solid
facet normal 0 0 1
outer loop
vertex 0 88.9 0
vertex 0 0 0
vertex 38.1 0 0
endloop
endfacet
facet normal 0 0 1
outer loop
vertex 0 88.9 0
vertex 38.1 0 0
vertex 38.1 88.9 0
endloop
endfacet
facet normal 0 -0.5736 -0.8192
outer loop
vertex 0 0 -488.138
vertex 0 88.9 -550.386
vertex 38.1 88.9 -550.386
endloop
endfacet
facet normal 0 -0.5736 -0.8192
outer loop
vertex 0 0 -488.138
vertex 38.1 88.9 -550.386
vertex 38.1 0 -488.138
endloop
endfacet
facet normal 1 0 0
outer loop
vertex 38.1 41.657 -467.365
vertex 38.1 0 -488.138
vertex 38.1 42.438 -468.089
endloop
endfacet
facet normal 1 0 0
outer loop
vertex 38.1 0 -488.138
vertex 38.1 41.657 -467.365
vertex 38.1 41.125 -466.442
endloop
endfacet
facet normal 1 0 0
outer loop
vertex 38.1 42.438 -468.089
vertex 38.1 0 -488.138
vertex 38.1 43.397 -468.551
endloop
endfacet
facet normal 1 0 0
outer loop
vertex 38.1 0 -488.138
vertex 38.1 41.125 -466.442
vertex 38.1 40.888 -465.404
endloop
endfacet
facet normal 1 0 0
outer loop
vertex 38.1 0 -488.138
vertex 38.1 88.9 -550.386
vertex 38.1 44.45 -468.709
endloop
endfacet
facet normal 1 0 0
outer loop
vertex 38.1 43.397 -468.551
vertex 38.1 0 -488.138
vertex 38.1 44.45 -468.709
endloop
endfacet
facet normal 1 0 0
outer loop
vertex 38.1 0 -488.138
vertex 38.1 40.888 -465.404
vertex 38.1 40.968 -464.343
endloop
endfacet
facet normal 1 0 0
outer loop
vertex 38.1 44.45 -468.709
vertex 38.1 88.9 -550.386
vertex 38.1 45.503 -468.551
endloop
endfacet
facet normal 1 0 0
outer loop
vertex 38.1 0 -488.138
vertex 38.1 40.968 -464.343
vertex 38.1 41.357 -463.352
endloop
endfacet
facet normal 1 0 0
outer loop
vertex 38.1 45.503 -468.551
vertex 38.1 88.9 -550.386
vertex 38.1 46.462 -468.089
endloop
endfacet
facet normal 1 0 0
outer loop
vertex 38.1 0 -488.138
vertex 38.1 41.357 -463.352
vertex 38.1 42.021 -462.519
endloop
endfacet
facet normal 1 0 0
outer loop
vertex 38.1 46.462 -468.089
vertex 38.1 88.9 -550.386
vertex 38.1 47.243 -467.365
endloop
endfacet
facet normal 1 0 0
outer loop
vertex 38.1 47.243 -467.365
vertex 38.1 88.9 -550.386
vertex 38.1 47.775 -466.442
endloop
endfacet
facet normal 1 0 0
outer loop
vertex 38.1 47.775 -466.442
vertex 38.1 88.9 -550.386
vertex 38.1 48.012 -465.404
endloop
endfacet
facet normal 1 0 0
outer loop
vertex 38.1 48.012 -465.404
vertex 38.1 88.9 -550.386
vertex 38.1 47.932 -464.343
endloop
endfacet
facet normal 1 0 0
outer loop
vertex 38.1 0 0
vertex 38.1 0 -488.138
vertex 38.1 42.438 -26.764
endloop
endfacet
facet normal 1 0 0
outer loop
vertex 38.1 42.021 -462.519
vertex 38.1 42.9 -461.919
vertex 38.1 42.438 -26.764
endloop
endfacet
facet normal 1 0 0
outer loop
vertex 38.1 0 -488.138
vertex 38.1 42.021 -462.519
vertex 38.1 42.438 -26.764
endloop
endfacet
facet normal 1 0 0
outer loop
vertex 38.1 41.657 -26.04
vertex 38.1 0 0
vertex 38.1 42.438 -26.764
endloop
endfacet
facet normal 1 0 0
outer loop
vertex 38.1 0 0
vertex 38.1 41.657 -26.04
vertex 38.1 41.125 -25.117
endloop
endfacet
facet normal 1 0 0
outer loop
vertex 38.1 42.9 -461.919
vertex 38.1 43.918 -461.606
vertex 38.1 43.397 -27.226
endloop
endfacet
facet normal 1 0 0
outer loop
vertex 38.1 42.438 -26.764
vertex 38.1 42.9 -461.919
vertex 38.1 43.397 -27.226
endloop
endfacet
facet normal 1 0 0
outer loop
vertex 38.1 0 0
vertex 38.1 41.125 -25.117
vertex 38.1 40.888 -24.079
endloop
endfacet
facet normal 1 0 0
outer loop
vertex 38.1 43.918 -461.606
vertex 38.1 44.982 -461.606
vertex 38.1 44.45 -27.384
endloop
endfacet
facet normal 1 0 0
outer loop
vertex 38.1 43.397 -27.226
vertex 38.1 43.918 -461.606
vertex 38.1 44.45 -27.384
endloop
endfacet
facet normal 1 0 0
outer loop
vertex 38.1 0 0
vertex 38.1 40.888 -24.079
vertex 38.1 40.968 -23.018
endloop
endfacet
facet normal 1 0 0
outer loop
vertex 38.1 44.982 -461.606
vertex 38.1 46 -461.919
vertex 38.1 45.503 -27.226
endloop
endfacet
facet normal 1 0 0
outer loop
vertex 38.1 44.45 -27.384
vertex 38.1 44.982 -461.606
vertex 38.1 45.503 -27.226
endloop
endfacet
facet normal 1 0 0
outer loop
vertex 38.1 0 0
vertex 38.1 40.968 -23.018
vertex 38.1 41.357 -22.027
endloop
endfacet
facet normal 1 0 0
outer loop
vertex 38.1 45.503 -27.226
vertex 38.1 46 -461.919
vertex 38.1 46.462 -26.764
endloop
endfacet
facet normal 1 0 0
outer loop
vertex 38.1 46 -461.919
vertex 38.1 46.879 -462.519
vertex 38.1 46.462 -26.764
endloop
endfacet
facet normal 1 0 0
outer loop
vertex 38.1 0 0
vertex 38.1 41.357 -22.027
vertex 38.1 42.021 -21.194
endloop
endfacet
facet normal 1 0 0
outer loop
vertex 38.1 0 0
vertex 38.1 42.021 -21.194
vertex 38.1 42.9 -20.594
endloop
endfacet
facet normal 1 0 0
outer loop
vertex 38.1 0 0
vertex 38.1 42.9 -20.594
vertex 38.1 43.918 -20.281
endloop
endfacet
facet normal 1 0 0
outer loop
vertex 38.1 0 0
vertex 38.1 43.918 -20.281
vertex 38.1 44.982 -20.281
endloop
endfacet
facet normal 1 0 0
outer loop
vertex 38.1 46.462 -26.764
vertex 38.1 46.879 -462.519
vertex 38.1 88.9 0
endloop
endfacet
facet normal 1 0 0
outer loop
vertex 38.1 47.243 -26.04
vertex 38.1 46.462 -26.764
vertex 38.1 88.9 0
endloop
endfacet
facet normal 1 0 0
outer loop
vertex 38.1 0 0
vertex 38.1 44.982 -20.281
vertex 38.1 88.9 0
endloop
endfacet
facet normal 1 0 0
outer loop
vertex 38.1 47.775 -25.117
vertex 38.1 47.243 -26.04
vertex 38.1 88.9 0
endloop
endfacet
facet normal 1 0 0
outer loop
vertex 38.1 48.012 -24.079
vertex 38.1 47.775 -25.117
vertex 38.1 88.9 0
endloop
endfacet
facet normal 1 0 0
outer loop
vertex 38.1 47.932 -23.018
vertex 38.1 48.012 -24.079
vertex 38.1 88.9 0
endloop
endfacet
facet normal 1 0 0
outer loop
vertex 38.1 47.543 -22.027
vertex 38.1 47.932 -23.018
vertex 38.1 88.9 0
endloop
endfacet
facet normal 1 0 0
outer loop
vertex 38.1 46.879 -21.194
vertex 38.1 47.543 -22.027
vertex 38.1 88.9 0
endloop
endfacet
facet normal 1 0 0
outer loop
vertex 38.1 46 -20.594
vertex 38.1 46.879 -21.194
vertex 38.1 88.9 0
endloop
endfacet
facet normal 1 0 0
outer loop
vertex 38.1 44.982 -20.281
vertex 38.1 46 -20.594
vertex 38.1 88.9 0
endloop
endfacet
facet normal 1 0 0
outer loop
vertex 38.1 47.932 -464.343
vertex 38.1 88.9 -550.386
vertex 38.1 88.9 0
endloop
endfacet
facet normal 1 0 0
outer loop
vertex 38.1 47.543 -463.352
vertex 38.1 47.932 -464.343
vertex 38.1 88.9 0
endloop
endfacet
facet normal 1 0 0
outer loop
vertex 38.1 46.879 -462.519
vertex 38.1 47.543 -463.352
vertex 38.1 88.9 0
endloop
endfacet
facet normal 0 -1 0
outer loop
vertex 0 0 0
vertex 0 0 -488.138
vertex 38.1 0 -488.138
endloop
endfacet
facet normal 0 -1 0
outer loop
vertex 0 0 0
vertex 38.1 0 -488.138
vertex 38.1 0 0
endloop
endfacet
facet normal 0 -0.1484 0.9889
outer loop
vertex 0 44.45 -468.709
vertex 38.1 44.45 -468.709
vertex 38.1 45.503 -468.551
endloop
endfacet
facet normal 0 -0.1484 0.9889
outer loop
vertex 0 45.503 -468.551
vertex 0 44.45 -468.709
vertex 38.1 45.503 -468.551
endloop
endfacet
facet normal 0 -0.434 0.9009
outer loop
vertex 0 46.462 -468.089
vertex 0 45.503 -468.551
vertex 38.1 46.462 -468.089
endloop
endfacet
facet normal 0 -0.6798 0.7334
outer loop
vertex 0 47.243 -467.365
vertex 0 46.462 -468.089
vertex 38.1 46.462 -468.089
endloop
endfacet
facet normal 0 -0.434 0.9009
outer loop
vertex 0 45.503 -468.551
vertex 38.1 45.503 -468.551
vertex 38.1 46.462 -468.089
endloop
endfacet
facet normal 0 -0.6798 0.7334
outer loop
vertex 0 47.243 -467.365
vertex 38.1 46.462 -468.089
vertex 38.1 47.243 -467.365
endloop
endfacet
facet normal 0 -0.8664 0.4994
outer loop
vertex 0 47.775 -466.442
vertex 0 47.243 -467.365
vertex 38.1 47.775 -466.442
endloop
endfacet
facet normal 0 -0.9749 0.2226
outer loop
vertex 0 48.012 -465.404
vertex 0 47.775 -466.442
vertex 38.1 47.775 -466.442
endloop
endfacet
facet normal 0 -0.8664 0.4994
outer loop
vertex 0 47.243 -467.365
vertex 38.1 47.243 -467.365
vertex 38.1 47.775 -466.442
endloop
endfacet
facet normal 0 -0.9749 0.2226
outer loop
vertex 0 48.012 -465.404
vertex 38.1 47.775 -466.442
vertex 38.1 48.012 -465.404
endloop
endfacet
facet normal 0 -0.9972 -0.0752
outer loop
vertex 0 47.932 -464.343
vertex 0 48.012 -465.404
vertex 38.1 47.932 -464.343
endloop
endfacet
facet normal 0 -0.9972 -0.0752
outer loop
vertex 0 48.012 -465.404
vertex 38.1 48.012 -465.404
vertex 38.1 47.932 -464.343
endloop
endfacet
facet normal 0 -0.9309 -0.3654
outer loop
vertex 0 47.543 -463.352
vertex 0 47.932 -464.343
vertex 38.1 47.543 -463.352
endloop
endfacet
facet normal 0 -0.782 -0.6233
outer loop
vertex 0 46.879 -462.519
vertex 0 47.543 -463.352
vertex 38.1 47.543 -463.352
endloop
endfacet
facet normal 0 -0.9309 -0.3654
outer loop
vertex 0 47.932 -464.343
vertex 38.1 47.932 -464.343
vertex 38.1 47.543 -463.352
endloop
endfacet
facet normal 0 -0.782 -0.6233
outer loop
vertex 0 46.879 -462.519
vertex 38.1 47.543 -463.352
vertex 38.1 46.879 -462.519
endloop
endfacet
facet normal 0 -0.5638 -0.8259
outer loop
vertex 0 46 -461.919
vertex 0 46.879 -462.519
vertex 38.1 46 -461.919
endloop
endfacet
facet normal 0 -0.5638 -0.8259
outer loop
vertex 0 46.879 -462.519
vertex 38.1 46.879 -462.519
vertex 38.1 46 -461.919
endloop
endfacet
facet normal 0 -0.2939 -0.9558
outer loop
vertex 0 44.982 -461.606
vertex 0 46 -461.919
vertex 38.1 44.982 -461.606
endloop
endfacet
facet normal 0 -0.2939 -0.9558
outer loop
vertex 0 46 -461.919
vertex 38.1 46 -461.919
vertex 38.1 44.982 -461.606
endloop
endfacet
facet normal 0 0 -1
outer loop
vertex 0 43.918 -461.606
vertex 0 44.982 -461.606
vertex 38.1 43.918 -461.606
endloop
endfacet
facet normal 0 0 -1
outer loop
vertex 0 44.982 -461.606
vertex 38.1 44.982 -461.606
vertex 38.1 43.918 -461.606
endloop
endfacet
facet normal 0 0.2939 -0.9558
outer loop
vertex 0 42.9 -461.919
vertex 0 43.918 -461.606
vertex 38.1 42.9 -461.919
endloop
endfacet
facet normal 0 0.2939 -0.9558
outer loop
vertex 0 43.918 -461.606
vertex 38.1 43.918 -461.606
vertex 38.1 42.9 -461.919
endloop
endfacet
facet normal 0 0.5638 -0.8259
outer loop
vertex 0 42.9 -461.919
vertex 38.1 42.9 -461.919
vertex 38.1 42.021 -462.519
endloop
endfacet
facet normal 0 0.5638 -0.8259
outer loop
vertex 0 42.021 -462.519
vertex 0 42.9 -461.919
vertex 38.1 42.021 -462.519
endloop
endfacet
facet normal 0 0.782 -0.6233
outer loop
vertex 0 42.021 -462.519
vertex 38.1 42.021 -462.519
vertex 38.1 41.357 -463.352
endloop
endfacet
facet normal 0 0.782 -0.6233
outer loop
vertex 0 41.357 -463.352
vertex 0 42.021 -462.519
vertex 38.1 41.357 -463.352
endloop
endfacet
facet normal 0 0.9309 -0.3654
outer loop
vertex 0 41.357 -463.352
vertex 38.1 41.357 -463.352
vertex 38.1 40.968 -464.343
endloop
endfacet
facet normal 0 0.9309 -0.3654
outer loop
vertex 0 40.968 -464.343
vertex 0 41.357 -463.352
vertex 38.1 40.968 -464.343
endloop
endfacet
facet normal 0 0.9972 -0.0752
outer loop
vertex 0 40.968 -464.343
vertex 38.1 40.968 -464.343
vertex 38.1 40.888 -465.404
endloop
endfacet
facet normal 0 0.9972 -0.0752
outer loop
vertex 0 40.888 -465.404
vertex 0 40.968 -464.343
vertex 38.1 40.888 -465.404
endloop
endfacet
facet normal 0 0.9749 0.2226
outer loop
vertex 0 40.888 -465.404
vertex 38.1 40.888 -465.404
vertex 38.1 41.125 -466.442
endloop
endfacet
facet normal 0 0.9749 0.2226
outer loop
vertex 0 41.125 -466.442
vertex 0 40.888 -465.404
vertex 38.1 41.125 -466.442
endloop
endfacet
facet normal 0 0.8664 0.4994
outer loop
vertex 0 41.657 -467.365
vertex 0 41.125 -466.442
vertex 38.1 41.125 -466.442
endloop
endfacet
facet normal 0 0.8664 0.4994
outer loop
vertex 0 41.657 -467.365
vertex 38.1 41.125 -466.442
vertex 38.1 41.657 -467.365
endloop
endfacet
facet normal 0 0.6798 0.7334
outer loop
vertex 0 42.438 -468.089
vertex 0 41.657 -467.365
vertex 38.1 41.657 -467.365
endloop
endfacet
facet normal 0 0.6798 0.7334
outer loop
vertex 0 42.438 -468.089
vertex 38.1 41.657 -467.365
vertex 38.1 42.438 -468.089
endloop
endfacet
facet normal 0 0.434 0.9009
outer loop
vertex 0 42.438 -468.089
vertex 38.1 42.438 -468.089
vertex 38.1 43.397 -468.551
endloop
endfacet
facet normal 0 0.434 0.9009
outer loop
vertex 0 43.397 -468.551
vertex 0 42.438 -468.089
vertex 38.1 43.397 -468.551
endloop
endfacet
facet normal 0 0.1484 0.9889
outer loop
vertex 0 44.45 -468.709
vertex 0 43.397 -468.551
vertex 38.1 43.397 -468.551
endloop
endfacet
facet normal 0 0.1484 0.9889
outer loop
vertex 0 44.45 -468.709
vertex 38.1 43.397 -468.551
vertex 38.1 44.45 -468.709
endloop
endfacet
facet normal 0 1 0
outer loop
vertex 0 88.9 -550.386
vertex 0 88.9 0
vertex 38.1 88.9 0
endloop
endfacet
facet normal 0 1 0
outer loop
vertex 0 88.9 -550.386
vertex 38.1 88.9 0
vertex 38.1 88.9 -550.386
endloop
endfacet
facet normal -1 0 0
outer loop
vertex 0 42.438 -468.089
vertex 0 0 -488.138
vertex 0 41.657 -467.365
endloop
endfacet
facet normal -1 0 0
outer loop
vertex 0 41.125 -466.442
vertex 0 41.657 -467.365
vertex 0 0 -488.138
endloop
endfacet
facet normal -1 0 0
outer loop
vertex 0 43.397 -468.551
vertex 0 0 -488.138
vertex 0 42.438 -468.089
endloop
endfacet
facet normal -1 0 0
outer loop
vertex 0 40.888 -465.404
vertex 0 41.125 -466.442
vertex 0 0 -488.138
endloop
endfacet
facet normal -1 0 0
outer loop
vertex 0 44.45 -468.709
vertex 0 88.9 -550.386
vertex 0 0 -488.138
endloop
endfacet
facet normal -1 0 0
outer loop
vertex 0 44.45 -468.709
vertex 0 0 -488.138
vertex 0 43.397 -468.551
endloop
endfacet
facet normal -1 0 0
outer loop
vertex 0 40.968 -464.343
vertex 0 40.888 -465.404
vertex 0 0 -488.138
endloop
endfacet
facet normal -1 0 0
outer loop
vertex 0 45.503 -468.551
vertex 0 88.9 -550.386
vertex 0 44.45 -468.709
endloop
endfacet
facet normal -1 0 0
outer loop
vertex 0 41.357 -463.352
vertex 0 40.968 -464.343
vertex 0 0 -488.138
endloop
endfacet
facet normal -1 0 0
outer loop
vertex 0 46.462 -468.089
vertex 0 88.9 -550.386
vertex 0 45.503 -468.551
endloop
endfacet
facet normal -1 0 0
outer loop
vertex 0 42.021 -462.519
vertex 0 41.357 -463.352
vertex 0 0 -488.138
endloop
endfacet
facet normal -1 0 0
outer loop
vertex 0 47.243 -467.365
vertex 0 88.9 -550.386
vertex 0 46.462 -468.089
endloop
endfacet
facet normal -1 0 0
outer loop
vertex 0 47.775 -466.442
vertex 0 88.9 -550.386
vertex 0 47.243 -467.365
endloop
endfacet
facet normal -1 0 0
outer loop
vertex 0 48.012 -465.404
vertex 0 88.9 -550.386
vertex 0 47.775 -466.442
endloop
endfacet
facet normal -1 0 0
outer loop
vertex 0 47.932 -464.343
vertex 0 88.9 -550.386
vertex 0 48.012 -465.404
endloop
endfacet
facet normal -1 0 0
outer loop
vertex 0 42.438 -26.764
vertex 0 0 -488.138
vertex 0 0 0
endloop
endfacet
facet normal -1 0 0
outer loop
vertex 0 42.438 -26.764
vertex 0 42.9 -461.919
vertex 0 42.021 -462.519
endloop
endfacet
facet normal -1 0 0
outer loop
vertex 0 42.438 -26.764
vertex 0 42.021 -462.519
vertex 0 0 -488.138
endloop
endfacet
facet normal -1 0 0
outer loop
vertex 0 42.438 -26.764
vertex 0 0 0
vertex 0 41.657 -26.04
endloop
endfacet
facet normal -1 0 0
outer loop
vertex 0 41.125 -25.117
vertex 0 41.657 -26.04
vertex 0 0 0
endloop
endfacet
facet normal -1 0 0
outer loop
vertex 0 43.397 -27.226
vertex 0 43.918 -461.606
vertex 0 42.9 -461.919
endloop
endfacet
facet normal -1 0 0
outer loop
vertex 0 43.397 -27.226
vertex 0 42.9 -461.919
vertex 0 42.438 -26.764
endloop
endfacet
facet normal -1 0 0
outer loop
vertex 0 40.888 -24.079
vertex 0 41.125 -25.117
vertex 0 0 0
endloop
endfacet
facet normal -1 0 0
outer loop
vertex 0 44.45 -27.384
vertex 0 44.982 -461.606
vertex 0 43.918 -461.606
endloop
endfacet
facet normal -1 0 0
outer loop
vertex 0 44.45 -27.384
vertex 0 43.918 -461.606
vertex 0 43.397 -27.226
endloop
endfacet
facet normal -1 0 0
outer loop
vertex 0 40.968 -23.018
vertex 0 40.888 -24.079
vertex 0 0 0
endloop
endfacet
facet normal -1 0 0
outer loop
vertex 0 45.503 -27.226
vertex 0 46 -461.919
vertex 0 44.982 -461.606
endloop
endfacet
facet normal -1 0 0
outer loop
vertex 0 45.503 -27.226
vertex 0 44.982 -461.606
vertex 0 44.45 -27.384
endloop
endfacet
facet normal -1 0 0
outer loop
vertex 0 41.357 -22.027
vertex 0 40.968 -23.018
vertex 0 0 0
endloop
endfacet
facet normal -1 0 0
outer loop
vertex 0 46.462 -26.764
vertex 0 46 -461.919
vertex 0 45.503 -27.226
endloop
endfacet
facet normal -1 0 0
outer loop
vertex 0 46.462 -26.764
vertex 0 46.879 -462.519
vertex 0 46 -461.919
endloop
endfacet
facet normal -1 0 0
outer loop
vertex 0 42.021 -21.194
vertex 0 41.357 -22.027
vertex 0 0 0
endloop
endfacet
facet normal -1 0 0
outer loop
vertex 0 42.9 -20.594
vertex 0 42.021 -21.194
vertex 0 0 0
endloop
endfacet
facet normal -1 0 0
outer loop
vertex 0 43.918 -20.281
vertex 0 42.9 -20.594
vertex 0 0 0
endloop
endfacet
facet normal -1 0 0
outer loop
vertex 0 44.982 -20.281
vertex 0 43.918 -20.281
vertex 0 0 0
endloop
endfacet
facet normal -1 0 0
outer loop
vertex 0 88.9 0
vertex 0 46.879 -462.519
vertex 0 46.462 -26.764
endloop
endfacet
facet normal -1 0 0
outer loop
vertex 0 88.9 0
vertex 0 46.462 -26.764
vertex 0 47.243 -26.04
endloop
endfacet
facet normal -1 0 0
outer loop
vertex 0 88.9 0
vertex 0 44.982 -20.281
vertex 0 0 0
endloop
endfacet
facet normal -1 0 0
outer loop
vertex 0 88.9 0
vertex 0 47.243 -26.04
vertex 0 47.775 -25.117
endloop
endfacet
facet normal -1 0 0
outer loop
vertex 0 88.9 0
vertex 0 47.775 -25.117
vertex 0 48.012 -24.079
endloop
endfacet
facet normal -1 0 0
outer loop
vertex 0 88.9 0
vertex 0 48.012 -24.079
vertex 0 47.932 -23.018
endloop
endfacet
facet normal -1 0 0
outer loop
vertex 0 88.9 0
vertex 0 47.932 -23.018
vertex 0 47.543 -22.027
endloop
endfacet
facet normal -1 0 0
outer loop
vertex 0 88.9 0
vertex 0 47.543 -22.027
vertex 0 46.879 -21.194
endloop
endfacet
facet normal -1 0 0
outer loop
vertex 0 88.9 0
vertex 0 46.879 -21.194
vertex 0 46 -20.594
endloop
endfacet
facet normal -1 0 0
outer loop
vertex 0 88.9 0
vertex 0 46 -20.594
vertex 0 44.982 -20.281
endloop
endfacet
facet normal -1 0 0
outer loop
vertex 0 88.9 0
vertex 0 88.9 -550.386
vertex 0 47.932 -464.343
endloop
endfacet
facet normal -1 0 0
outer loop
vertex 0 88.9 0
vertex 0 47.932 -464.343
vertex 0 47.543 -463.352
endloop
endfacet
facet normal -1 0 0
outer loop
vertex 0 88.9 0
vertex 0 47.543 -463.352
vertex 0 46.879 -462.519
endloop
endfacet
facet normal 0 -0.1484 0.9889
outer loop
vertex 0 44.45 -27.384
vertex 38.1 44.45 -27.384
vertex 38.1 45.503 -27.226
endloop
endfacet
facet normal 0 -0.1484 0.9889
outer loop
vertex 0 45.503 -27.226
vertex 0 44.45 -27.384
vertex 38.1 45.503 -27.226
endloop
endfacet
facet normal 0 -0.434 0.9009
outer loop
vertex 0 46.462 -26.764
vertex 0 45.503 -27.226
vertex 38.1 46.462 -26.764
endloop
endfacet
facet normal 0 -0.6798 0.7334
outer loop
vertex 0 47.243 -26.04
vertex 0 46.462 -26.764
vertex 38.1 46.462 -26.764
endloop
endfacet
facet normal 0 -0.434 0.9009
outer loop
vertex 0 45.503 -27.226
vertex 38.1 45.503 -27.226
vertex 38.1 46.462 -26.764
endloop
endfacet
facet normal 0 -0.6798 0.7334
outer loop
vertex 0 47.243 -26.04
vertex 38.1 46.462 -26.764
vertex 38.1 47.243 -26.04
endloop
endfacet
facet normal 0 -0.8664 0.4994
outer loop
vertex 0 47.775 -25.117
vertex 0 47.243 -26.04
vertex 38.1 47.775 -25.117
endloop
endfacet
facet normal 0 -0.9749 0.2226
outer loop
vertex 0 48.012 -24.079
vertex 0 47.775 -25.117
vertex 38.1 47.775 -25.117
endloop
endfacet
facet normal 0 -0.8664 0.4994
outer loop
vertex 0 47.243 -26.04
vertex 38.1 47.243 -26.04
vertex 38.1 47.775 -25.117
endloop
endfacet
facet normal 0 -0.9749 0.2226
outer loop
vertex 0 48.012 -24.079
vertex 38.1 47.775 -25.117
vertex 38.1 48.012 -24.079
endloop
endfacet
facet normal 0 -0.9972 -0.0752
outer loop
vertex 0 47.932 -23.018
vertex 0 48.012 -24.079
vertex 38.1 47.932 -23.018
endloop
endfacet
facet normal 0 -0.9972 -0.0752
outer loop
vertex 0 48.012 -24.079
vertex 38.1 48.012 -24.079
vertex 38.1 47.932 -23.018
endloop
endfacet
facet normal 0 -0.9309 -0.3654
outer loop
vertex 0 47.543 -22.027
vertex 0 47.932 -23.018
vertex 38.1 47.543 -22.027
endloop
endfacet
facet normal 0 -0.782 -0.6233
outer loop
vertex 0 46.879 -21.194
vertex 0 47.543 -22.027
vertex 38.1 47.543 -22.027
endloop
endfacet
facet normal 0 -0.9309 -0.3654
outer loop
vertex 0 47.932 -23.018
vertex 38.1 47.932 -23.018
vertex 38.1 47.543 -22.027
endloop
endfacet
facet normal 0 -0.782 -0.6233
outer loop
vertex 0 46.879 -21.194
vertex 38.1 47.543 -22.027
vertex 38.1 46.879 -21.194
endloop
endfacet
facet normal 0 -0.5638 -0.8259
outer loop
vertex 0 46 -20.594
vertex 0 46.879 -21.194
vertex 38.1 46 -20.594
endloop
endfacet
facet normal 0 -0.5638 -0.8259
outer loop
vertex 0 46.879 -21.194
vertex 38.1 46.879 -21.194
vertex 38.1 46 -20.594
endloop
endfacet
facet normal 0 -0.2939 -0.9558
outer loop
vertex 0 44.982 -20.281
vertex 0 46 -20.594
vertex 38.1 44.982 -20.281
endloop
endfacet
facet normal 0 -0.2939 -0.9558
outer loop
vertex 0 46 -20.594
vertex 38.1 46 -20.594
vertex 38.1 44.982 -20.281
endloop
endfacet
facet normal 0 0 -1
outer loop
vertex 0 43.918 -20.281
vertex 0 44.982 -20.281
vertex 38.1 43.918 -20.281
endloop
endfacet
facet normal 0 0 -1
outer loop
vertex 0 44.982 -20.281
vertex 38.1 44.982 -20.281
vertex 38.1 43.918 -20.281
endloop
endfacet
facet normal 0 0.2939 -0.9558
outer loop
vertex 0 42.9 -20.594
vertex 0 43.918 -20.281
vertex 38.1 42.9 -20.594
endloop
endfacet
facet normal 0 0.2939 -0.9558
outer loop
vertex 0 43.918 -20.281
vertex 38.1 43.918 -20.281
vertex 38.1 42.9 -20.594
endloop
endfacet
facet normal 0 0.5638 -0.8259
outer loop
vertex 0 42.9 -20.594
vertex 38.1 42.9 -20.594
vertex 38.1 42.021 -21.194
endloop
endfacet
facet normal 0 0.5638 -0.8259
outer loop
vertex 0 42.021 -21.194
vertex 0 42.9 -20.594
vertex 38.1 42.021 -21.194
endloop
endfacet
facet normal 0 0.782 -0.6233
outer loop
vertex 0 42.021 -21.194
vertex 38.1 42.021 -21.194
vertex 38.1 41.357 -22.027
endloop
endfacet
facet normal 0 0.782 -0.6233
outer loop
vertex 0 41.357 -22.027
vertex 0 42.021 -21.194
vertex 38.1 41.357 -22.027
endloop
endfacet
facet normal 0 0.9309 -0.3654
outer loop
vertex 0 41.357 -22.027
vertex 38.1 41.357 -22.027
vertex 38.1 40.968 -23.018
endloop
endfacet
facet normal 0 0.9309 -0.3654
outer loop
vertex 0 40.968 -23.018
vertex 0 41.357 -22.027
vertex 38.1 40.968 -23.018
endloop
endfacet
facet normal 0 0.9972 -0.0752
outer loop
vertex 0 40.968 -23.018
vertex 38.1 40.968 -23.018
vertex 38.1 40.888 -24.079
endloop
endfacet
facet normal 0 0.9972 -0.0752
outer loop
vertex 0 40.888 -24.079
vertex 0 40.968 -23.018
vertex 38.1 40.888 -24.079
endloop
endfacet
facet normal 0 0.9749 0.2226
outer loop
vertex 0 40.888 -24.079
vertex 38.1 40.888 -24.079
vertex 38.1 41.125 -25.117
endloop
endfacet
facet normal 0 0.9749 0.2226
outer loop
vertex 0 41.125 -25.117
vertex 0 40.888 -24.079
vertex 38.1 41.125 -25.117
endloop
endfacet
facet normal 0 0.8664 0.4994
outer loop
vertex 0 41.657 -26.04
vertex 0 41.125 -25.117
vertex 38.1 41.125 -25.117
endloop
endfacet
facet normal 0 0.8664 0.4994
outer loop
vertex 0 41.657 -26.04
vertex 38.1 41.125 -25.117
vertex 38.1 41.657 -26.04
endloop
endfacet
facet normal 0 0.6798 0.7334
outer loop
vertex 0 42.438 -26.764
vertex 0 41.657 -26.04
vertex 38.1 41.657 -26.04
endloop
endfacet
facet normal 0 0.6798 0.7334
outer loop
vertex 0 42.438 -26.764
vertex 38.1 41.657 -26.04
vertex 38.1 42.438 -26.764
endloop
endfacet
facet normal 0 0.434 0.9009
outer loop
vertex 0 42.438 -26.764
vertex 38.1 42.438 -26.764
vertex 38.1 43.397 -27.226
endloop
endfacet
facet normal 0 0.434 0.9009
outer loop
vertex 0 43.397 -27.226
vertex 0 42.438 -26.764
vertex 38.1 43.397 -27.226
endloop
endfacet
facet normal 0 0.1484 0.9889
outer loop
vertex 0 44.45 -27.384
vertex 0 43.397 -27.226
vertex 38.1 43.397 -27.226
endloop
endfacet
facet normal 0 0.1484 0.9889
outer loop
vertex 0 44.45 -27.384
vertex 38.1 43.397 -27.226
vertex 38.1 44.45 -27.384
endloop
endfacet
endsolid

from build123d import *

# Parameters (mm, degrees)
BOSS_EXTRUDE1_DEPTH = 38.1
SKETCH2_R           = 3.571875
CUT_EXTRUDE1_DEPTH  = 559.820020083


with BuildPart() as part:
    # Sketch1 → Boss-Extrude1 (new body)
    with BuildSketch(Plane(origin=(0, 0, 0), x_dir=(0, 0, -1), z_dir=(1, 0, 0))):
        Polygon((0, 88.9), (550.386223343, 88.9), (488.137773196, 0), (0, 0), align=None)
    extrude(amount=BOSS_EXTRUDE1_DEPTH)

    # Sketch2 → Cut-Extrude1 (cut, through all)
    with BuildSketch(Plane(origin=(38.1, 0, 0), x_dir=(0, 0, -1), z_dir=(1, 0, 0))):
        with Locations((23.8125, 44.45)):
            Circle(SKETCH2_R)
        with Locations((465.1375, 44.45)):
            Circle(SKETCH2_R)
    extrude(amount=-CUT_EXTRUDE1_DEPTH, mode=Mode.SUBTRACT)


solid = part.part
